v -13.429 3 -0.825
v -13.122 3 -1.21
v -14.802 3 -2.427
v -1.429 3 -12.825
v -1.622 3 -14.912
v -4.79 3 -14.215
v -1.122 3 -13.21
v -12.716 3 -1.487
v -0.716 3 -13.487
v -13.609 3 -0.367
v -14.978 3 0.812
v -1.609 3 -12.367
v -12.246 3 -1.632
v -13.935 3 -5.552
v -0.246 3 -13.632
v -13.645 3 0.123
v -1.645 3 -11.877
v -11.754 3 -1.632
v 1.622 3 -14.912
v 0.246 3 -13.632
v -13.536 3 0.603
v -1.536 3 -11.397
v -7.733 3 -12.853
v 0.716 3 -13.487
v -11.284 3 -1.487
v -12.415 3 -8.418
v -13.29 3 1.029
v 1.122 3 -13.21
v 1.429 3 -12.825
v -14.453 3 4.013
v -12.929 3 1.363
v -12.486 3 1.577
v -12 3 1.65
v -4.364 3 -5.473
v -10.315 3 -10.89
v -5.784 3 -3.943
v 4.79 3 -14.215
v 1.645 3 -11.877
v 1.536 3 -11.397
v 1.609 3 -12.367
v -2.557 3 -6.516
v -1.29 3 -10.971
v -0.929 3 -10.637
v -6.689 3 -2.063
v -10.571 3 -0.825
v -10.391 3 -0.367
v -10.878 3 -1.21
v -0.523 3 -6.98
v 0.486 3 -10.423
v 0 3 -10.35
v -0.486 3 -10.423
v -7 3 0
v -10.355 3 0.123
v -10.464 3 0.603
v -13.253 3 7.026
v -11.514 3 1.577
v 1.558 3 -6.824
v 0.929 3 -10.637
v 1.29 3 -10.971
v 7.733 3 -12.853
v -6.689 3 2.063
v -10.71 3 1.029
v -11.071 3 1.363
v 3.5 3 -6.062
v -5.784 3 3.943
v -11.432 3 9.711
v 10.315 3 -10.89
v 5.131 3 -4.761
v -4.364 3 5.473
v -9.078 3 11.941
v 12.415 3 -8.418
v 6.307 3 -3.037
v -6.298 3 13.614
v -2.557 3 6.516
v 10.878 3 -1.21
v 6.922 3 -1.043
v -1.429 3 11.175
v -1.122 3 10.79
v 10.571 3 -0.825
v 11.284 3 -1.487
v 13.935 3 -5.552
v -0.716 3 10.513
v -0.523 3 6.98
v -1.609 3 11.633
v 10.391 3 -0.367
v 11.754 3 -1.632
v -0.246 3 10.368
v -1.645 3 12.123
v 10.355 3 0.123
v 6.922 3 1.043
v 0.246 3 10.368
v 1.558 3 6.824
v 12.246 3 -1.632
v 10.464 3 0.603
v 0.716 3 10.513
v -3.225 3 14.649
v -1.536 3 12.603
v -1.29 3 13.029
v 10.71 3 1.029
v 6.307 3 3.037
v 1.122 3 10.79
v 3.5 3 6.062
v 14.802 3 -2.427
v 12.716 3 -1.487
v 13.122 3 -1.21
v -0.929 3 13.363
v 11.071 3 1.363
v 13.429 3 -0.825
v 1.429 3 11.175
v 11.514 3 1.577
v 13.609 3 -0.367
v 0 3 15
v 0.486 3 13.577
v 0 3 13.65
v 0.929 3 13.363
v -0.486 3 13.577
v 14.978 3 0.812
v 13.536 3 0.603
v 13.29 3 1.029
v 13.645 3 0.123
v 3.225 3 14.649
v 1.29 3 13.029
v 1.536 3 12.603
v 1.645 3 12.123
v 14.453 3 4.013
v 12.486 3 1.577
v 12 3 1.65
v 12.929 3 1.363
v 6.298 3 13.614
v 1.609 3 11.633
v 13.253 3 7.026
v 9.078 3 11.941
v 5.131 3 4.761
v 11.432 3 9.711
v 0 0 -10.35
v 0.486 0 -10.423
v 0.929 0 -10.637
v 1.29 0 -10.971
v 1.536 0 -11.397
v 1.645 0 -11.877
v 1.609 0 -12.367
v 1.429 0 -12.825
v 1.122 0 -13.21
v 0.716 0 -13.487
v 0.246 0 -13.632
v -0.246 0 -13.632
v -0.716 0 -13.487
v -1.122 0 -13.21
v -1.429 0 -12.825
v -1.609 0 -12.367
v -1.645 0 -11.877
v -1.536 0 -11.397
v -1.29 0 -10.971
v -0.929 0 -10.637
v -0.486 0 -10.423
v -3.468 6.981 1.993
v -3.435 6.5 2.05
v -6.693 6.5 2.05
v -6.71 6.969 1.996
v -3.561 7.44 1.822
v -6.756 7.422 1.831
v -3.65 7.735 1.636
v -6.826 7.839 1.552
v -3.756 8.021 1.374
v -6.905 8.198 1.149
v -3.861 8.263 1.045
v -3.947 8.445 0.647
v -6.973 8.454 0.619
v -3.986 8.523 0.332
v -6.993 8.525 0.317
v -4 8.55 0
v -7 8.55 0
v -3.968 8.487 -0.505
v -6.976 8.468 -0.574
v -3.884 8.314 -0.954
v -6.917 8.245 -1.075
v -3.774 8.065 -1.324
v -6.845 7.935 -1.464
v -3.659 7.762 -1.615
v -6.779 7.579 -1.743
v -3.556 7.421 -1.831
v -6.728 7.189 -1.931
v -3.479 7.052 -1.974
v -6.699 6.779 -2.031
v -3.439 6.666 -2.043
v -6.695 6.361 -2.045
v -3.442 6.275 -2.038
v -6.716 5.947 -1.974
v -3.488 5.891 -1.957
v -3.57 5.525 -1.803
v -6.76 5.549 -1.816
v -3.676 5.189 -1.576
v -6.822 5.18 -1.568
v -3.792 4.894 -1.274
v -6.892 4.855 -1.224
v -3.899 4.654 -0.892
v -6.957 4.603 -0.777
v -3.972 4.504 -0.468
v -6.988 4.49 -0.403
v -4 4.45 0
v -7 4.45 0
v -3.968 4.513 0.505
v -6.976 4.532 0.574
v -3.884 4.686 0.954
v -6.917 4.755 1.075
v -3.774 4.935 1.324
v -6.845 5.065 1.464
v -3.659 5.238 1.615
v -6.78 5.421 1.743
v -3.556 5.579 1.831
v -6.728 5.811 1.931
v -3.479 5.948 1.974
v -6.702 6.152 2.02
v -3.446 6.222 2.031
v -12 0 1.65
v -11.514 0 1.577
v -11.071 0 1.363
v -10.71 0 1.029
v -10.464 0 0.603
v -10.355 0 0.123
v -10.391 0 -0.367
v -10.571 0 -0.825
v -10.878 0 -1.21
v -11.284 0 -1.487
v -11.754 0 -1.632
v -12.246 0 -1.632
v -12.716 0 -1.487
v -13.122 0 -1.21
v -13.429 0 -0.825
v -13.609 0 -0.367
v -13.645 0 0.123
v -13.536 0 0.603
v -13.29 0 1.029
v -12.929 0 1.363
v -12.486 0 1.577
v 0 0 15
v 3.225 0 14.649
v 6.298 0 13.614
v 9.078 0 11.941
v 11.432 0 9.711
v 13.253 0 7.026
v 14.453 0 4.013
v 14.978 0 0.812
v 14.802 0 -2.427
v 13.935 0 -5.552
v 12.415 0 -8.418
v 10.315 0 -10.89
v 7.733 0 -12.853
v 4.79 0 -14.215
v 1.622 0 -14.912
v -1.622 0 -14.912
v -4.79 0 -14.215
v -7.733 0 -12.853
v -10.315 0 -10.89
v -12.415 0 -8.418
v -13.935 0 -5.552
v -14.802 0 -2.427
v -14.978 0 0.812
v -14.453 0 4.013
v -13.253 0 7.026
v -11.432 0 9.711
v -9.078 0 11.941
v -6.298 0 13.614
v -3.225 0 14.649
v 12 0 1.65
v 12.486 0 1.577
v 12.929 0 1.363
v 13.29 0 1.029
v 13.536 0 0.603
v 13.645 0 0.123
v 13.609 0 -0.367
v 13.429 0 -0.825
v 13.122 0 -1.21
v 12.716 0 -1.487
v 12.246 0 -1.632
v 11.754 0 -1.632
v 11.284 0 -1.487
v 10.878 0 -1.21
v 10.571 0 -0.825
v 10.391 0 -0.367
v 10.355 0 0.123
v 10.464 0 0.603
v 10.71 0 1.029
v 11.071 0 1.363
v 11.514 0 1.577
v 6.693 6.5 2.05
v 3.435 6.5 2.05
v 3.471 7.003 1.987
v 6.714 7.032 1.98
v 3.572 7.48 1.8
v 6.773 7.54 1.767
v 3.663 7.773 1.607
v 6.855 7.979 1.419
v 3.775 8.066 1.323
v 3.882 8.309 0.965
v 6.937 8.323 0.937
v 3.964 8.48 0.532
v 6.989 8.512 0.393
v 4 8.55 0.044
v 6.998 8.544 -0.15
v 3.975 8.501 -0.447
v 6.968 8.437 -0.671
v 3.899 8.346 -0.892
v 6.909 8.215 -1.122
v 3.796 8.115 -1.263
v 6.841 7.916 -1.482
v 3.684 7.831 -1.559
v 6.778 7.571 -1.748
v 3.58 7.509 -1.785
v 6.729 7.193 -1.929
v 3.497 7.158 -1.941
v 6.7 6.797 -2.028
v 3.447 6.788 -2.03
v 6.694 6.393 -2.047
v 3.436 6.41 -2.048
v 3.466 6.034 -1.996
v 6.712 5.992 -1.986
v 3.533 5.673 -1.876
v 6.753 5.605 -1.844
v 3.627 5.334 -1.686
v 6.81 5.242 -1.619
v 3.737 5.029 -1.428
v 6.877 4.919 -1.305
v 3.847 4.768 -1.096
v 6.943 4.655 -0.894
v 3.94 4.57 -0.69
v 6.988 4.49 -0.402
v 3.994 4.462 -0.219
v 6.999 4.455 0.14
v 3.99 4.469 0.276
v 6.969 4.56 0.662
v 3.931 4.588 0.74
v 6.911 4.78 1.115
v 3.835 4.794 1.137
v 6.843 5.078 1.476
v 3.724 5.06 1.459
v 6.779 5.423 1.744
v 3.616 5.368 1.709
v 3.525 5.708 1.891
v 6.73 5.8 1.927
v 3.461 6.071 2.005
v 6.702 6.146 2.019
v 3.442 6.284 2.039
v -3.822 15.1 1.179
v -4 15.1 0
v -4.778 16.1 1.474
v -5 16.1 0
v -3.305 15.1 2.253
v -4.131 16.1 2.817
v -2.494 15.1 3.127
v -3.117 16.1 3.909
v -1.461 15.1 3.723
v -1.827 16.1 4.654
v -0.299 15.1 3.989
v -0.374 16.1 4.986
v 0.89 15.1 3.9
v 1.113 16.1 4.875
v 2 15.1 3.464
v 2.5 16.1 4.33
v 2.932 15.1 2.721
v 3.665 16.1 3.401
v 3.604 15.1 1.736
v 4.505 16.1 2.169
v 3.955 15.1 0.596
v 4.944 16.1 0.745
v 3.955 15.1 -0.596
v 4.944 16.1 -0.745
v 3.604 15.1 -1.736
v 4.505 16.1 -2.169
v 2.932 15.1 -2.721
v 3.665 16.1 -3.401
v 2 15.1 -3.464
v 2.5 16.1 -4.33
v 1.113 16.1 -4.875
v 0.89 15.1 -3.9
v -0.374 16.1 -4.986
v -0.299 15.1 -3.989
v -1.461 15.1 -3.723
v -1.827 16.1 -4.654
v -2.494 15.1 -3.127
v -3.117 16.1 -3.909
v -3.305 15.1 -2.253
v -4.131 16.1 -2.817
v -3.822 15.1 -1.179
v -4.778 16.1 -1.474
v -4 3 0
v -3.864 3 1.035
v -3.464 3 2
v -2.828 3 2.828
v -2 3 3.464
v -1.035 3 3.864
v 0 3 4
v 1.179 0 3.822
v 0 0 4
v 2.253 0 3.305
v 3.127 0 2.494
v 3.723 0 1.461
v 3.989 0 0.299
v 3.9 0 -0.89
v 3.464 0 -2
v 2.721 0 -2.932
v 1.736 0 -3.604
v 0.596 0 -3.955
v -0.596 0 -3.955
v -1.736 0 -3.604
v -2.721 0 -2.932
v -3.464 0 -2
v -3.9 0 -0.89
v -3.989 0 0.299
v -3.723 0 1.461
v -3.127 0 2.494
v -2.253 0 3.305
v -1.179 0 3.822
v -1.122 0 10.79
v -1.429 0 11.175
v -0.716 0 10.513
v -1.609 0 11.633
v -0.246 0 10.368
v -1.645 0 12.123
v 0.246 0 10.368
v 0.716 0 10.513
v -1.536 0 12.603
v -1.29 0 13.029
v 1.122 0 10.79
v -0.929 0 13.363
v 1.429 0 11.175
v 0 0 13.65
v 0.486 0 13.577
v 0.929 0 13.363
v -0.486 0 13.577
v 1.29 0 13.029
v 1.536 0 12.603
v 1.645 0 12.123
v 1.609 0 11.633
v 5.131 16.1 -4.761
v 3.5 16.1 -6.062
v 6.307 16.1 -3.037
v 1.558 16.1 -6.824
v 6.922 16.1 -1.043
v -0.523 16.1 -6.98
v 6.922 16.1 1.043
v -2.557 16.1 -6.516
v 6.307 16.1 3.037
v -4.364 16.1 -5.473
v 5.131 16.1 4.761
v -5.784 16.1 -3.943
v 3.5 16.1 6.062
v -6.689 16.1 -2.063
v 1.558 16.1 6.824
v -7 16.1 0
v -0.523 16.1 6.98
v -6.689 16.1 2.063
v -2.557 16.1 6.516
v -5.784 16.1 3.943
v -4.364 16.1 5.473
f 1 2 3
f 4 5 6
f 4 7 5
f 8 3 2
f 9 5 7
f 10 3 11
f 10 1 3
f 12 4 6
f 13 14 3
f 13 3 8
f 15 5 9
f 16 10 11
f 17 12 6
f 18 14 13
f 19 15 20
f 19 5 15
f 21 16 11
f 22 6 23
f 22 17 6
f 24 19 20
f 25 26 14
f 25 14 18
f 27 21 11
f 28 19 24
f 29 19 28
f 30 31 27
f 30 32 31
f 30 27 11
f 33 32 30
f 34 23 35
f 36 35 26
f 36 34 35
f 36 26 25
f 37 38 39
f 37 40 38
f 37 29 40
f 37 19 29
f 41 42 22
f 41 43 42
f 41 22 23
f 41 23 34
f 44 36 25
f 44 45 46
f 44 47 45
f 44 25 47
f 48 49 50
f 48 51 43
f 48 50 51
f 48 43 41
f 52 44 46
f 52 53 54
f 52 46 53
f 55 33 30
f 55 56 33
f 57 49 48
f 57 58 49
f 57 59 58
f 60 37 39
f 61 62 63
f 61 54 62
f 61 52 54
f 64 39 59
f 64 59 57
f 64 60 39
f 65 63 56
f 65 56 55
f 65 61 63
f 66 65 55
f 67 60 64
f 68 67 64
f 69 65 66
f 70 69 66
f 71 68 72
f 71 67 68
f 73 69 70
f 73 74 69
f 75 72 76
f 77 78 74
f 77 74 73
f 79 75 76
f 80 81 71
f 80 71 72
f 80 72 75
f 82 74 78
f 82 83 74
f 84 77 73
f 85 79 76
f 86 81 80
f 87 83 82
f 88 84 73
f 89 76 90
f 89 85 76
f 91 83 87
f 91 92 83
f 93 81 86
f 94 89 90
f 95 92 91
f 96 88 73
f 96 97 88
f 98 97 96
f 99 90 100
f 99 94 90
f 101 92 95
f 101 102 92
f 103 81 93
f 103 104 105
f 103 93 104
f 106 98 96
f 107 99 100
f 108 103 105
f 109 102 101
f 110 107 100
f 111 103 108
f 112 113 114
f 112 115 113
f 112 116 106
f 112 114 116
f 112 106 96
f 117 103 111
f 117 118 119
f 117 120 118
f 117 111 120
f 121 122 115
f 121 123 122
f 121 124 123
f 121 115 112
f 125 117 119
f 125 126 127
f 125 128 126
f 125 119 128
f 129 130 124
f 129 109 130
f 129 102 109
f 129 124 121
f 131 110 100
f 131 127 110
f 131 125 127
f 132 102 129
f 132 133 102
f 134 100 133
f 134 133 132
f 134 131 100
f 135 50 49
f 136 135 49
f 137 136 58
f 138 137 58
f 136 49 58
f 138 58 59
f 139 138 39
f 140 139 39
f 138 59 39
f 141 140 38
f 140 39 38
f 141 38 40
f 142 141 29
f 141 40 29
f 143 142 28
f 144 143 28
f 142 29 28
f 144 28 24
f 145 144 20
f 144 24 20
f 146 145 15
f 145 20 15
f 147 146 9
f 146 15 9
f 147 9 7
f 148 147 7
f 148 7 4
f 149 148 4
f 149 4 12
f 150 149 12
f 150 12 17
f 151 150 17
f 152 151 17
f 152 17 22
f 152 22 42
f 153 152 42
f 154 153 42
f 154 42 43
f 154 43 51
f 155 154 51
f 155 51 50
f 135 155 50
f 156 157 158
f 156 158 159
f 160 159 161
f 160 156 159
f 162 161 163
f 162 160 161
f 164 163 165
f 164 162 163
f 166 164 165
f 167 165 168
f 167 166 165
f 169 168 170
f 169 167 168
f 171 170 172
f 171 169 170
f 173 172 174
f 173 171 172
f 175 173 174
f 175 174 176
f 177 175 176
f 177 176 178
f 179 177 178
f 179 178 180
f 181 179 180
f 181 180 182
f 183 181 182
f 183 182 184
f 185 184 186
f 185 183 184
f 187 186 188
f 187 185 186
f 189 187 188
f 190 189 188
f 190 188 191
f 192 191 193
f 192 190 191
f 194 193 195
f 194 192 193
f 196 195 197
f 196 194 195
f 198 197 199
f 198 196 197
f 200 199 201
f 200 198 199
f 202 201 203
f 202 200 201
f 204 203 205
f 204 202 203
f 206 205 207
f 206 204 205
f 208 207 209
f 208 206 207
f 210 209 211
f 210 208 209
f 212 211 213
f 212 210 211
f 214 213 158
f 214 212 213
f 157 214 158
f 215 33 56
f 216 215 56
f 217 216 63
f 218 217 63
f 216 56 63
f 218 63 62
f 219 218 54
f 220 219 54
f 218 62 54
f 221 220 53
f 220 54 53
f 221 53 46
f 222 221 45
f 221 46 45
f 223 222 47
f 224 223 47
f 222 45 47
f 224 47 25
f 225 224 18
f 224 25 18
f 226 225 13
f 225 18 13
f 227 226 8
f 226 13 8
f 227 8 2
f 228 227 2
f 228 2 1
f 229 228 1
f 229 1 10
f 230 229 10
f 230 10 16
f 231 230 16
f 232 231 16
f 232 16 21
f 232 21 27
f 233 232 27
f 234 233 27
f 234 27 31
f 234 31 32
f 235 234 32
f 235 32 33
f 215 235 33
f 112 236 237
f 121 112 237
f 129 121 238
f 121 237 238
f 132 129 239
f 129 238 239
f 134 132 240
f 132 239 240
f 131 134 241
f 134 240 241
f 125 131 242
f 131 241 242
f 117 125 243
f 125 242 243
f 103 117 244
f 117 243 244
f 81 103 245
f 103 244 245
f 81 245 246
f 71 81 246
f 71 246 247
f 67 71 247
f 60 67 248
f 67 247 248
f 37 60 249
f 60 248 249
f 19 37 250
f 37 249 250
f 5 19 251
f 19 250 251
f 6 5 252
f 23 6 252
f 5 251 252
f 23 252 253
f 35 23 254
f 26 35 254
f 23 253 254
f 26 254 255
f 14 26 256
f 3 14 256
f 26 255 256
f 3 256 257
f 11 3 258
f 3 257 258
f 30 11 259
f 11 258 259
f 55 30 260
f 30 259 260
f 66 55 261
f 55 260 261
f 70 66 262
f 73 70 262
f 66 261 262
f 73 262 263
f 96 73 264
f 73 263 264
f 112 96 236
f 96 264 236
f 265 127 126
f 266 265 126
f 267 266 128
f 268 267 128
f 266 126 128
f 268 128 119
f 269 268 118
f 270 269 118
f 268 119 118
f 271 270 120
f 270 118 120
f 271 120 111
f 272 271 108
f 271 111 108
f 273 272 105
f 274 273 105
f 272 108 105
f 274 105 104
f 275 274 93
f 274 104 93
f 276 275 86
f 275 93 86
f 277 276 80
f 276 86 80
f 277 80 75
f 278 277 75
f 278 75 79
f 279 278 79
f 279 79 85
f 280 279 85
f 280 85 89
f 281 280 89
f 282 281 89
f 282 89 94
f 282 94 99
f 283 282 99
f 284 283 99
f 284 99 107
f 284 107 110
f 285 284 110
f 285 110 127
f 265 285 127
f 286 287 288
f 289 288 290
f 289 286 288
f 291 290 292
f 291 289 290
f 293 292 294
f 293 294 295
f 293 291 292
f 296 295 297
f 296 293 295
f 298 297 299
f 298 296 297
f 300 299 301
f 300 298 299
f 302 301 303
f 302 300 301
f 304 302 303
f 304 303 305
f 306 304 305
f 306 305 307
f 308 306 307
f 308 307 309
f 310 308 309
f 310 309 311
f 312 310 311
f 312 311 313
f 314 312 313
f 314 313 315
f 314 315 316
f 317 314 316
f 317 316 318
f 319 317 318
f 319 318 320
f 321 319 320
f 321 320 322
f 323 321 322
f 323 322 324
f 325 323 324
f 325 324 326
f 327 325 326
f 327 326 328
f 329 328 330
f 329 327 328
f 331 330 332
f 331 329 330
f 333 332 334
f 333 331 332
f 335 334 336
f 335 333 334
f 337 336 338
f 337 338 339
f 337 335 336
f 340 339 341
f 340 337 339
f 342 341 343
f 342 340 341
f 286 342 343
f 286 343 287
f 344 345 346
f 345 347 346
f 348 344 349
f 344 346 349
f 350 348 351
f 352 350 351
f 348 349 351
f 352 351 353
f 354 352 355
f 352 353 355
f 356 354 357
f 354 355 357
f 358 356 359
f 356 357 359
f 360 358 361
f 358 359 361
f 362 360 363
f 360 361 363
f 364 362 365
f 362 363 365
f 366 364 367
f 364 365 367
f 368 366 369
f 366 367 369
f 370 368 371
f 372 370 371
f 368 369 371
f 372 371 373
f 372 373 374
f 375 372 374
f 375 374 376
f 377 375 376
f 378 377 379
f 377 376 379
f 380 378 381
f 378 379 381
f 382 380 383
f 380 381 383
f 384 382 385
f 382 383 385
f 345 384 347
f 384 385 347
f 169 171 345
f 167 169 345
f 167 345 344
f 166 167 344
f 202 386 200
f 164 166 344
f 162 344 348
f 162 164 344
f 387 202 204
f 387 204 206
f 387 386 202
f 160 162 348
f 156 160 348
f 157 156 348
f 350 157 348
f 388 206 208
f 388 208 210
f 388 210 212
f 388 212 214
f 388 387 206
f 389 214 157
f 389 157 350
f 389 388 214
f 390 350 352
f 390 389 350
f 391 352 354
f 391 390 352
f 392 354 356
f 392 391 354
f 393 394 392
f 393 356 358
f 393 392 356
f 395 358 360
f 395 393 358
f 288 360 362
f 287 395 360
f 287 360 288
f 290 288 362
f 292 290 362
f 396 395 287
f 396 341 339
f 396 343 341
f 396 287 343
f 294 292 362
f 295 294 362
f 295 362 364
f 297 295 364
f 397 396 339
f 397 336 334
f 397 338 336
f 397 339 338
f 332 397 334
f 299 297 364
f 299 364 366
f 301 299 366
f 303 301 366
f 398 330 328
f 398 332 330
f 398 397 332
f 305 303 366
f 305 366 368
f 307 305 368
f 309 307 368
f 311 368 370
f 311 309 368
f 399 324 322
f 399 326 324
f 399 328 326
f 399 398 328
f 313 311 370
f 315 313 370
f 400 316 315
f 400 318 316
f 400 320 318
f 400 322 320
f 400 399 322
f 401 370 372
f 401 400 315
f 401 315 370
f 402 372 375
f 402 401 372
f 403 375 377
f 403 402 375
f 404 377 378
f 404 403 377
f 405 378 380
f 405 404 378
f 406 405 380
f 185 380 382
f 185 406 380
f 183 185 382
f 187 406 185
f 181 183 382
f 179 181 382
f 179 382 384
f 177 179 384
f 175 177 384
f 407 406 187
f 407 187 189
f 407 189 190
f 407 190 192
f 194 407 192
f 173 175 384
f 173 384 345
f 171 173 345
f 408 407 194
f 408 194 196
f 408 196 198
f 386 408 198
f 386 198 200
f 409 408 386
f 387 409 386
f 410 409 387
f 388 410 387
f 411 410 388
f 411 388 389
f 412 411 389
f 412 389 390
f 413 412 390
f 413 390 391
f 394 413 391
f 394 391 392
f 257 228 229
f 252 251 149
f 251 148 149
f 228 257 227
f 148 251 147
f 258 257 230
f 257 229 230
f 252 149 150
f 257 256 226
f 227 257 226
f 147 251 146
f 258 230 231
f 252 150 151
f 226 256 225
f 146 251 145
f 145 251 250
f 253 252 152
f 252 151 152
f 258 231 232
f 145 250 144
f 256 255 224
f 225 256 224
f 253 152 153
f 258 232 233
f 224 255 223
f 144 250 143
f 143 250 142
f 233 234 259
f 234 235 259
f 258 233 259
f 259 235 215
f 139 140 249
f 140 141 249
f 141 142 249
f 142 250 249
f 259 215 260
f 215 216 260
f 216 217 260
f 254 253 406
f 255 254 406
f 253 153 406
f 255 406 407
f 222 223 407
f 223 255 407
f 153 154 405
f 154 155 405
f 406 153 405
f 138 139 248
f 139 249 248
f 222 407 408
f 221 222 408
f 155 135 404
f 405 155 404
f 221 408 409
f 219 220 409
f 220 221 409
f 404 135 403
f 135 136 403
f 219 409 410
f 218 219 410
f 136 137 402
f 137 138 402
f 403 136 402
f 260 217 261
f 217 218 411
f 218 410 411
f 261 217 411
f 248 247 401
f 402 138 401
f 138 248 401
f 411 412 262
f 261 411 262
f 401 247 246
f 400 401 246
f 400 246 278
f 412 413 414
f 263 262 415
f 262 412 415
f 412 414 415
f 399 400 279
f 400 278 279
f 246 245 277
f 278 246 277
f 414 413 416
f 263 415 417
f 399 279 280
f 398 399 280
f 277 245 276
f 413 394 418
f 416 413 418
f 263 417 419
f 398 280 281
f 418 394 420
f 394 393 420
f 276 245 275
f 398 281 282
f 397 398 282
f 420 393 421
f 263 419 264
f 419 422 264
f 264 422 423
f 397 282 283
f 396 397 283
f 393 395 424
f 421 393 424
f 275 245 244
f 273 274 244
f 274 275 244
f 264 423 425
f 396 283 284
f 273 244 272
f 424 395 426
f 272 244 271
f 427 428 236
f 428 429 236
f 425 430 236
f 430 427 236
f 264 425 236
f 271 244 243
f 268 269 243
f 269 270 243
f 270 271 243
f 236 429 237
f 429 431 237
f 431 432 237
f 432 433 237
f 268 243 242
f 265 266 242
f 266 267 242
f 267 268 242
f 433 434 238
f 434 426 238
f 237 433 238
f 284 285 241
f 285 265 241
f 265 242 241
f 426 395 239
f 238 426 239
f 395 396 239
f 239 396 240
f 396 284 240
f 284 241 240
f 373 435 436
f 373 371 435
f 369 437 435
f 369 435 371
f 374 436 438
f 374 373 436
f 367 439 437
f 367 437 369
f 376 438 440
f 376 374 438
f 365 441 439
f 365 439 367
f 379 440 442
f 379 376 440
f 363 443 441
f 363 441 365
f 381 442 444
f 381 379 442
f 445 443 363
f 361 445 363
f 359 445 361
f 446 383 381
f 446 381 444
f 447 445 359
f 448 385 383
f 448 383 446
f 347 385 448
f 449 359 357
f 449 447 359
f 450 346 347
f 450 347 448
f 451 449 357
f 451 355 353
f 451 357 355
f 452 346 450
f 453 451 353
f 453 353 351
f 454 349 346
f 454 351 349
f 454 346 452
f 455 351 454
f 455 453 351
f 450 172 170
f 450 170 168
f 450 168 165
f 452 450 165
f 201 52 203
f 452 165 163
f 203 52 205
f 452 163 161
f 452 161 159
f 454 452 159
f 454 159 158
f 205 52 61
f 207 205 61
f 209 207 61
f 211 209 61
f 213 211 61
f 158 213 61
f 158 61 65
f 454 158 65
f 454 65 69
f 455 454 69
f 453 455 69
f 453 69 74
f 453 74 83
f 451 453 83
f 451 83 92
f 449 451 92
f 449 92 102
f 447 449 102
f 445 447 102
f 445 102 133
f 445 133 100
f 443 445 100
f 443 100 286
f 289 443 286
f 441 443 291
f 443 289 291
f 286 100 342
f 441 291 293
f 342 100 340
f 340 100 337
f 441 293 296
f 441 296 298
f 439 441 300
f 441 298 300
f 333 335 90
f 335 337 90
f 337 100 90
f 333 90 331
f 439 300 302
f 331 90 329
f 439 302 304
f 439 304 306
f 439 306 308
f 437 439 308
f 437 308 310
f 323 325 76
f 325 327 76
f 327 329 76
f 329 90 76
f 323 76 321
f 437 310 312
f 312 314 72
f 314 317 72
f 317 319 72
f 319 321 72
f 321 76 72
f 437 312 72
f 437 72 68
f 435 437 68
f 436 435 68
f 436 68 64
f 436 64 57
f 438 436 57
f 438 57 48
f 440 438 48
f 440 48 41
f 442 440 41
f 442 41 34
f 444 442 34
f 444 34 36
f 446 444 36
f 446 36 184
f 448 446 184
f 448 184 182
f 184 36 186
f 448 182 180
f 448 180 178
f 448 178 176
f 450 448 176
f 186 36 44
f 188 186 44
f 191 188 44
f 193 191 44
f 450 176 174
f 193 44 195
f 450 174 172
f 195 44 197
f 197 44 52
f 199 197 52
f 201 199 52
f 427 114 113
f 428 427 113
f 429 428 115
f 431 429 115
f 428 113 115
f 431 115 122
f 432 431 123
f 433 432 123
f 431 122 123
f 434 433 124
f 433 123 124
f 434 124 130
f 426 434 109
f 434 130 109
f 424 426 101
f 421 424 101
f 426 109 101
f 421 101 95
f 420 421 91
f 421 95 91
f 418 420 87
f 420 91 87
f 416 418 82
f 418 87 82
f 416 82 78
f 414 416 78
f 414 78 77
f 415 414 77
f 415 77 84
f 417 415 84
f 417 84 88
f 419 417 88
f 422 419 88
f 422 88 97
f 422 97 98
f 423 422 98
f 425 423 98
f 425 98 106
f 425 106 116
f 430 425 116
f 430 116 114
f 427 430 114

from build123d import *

# Parameters (mm, degrees)
SKETCH_1_R               = 15
SKETCH_1_R_2             = 4
EXTRUDE_1_DEPTH          = 3
SKETCH_2_R               = 7
SKETCH_2_R_2             = 4
EXTRUDE_2_DEPTH          = 13.1
CUT_EXTRUDE_1_DEPTH      = 27.630996977
CUT_EXTRUDE_1_DEPTH_BACK = 10
SKETCH_5_R               = 2.05
SKETCH_7_R               = 1.65
CUT_EXTRUDE_3_DEPTH      = 4
CHAMFER_1_SIZE           = 1


with BuildPart() as part:
    # 草图1 → 凸台-拉伸1 (new body)
    with BuildSketch(Plane(origin=(0, 0, 0), x_dir=(1, 0, 0), z_dir=(0, 1, 0))):
        with Locations(Location((0, 0, 0), (0, 0, 270))):
            Circle(SKETCH_1_R)
        with Locations(Location((0, 0, 0), (0, 0, 270))):
            Circle(SKETCH_1_R_2, mode=Mode.SUBTRACT)
    extrude(amount=EXTRUDE_1_DEPTH)

    # 草图2 → 凸台-拉伸2 (add)
    with BuildSketch(Plane(origin=(0, 3, 0), x_dir=(1, 0, 0), z_dir=(0, 1, 0))):
        with Locations(Location((0, 0, 0), (0, 0, 180))):
            Circle(SKETCH_2_R)
        with Locations(Location((0, 0, 0), (0, 0, 180))):
            Circle(SKETCH_2_R_2, mode=Mode.SUBTRACT)
    extrude(amount=EXTRUDE_2_DEPTH)

    # 草图5 → 切除-拉伸1 (cut, two sides: drawn at the far end of the back side and taken through both)
    with BuildSketch(Plane.ZY.offset(-CUT_EXTRUDE_1_DEPTH_BACK)):
        with Locations((0, 6.5)):
            Circle(SKETCH_5_R)
    extrude(amount=CUT_EXTRUDE_1_DEPTH + CUT_EXTRUDE_1_DEPTH_BACK, mode=Mode.SUBTRACT)

    # 草图7 → 切除-拉伸3 (cut)
    with BuildSketch(Plane(origin=(0, 3, 0), x_dir=(1, 0, 0), z_dir=(0, 1, 0))):
        with Locations(Location((12, 0, 0), (0, 0, 270))):
            Circle(SKETCH_7_R)
        with Locations(Location((0, -12, 0), (0, 0, 270))):
            Circle(SKETCH_7_R)
        with Locations(Location((-12, 0, 0), (0, 0, 270))):
            Circle(SKETCH_7_R)
        with Locations(Location((0, 12, 0), (0, 0, 270))):
            Circle(SKETCH_7_R)
    extrude(amount=-CUT_EXTRUDE_3_DEPTH, mode=Mode.SUBTRACT)

    # 倒角1
    # the kernel refuses this chamfer: 1 mm, written as the material it takes off along each edge
    with BuildSketch(Plane(origin=(0, 16.1, 0), x_dir=(-1, 0, 0), z_dir=(0, 0, -1))) as chamfer_1_piece_1:
        Polygon((4, -CHAMFER_1_SIZE), (4 + CHAMFER_1_SIZE, 0), (4, 0), align=None)
    revolve(axis=Axis((0, 16.1, 0), (0, 1, 0)), mode=Mode.SUBTRACT)


solid = part.part
